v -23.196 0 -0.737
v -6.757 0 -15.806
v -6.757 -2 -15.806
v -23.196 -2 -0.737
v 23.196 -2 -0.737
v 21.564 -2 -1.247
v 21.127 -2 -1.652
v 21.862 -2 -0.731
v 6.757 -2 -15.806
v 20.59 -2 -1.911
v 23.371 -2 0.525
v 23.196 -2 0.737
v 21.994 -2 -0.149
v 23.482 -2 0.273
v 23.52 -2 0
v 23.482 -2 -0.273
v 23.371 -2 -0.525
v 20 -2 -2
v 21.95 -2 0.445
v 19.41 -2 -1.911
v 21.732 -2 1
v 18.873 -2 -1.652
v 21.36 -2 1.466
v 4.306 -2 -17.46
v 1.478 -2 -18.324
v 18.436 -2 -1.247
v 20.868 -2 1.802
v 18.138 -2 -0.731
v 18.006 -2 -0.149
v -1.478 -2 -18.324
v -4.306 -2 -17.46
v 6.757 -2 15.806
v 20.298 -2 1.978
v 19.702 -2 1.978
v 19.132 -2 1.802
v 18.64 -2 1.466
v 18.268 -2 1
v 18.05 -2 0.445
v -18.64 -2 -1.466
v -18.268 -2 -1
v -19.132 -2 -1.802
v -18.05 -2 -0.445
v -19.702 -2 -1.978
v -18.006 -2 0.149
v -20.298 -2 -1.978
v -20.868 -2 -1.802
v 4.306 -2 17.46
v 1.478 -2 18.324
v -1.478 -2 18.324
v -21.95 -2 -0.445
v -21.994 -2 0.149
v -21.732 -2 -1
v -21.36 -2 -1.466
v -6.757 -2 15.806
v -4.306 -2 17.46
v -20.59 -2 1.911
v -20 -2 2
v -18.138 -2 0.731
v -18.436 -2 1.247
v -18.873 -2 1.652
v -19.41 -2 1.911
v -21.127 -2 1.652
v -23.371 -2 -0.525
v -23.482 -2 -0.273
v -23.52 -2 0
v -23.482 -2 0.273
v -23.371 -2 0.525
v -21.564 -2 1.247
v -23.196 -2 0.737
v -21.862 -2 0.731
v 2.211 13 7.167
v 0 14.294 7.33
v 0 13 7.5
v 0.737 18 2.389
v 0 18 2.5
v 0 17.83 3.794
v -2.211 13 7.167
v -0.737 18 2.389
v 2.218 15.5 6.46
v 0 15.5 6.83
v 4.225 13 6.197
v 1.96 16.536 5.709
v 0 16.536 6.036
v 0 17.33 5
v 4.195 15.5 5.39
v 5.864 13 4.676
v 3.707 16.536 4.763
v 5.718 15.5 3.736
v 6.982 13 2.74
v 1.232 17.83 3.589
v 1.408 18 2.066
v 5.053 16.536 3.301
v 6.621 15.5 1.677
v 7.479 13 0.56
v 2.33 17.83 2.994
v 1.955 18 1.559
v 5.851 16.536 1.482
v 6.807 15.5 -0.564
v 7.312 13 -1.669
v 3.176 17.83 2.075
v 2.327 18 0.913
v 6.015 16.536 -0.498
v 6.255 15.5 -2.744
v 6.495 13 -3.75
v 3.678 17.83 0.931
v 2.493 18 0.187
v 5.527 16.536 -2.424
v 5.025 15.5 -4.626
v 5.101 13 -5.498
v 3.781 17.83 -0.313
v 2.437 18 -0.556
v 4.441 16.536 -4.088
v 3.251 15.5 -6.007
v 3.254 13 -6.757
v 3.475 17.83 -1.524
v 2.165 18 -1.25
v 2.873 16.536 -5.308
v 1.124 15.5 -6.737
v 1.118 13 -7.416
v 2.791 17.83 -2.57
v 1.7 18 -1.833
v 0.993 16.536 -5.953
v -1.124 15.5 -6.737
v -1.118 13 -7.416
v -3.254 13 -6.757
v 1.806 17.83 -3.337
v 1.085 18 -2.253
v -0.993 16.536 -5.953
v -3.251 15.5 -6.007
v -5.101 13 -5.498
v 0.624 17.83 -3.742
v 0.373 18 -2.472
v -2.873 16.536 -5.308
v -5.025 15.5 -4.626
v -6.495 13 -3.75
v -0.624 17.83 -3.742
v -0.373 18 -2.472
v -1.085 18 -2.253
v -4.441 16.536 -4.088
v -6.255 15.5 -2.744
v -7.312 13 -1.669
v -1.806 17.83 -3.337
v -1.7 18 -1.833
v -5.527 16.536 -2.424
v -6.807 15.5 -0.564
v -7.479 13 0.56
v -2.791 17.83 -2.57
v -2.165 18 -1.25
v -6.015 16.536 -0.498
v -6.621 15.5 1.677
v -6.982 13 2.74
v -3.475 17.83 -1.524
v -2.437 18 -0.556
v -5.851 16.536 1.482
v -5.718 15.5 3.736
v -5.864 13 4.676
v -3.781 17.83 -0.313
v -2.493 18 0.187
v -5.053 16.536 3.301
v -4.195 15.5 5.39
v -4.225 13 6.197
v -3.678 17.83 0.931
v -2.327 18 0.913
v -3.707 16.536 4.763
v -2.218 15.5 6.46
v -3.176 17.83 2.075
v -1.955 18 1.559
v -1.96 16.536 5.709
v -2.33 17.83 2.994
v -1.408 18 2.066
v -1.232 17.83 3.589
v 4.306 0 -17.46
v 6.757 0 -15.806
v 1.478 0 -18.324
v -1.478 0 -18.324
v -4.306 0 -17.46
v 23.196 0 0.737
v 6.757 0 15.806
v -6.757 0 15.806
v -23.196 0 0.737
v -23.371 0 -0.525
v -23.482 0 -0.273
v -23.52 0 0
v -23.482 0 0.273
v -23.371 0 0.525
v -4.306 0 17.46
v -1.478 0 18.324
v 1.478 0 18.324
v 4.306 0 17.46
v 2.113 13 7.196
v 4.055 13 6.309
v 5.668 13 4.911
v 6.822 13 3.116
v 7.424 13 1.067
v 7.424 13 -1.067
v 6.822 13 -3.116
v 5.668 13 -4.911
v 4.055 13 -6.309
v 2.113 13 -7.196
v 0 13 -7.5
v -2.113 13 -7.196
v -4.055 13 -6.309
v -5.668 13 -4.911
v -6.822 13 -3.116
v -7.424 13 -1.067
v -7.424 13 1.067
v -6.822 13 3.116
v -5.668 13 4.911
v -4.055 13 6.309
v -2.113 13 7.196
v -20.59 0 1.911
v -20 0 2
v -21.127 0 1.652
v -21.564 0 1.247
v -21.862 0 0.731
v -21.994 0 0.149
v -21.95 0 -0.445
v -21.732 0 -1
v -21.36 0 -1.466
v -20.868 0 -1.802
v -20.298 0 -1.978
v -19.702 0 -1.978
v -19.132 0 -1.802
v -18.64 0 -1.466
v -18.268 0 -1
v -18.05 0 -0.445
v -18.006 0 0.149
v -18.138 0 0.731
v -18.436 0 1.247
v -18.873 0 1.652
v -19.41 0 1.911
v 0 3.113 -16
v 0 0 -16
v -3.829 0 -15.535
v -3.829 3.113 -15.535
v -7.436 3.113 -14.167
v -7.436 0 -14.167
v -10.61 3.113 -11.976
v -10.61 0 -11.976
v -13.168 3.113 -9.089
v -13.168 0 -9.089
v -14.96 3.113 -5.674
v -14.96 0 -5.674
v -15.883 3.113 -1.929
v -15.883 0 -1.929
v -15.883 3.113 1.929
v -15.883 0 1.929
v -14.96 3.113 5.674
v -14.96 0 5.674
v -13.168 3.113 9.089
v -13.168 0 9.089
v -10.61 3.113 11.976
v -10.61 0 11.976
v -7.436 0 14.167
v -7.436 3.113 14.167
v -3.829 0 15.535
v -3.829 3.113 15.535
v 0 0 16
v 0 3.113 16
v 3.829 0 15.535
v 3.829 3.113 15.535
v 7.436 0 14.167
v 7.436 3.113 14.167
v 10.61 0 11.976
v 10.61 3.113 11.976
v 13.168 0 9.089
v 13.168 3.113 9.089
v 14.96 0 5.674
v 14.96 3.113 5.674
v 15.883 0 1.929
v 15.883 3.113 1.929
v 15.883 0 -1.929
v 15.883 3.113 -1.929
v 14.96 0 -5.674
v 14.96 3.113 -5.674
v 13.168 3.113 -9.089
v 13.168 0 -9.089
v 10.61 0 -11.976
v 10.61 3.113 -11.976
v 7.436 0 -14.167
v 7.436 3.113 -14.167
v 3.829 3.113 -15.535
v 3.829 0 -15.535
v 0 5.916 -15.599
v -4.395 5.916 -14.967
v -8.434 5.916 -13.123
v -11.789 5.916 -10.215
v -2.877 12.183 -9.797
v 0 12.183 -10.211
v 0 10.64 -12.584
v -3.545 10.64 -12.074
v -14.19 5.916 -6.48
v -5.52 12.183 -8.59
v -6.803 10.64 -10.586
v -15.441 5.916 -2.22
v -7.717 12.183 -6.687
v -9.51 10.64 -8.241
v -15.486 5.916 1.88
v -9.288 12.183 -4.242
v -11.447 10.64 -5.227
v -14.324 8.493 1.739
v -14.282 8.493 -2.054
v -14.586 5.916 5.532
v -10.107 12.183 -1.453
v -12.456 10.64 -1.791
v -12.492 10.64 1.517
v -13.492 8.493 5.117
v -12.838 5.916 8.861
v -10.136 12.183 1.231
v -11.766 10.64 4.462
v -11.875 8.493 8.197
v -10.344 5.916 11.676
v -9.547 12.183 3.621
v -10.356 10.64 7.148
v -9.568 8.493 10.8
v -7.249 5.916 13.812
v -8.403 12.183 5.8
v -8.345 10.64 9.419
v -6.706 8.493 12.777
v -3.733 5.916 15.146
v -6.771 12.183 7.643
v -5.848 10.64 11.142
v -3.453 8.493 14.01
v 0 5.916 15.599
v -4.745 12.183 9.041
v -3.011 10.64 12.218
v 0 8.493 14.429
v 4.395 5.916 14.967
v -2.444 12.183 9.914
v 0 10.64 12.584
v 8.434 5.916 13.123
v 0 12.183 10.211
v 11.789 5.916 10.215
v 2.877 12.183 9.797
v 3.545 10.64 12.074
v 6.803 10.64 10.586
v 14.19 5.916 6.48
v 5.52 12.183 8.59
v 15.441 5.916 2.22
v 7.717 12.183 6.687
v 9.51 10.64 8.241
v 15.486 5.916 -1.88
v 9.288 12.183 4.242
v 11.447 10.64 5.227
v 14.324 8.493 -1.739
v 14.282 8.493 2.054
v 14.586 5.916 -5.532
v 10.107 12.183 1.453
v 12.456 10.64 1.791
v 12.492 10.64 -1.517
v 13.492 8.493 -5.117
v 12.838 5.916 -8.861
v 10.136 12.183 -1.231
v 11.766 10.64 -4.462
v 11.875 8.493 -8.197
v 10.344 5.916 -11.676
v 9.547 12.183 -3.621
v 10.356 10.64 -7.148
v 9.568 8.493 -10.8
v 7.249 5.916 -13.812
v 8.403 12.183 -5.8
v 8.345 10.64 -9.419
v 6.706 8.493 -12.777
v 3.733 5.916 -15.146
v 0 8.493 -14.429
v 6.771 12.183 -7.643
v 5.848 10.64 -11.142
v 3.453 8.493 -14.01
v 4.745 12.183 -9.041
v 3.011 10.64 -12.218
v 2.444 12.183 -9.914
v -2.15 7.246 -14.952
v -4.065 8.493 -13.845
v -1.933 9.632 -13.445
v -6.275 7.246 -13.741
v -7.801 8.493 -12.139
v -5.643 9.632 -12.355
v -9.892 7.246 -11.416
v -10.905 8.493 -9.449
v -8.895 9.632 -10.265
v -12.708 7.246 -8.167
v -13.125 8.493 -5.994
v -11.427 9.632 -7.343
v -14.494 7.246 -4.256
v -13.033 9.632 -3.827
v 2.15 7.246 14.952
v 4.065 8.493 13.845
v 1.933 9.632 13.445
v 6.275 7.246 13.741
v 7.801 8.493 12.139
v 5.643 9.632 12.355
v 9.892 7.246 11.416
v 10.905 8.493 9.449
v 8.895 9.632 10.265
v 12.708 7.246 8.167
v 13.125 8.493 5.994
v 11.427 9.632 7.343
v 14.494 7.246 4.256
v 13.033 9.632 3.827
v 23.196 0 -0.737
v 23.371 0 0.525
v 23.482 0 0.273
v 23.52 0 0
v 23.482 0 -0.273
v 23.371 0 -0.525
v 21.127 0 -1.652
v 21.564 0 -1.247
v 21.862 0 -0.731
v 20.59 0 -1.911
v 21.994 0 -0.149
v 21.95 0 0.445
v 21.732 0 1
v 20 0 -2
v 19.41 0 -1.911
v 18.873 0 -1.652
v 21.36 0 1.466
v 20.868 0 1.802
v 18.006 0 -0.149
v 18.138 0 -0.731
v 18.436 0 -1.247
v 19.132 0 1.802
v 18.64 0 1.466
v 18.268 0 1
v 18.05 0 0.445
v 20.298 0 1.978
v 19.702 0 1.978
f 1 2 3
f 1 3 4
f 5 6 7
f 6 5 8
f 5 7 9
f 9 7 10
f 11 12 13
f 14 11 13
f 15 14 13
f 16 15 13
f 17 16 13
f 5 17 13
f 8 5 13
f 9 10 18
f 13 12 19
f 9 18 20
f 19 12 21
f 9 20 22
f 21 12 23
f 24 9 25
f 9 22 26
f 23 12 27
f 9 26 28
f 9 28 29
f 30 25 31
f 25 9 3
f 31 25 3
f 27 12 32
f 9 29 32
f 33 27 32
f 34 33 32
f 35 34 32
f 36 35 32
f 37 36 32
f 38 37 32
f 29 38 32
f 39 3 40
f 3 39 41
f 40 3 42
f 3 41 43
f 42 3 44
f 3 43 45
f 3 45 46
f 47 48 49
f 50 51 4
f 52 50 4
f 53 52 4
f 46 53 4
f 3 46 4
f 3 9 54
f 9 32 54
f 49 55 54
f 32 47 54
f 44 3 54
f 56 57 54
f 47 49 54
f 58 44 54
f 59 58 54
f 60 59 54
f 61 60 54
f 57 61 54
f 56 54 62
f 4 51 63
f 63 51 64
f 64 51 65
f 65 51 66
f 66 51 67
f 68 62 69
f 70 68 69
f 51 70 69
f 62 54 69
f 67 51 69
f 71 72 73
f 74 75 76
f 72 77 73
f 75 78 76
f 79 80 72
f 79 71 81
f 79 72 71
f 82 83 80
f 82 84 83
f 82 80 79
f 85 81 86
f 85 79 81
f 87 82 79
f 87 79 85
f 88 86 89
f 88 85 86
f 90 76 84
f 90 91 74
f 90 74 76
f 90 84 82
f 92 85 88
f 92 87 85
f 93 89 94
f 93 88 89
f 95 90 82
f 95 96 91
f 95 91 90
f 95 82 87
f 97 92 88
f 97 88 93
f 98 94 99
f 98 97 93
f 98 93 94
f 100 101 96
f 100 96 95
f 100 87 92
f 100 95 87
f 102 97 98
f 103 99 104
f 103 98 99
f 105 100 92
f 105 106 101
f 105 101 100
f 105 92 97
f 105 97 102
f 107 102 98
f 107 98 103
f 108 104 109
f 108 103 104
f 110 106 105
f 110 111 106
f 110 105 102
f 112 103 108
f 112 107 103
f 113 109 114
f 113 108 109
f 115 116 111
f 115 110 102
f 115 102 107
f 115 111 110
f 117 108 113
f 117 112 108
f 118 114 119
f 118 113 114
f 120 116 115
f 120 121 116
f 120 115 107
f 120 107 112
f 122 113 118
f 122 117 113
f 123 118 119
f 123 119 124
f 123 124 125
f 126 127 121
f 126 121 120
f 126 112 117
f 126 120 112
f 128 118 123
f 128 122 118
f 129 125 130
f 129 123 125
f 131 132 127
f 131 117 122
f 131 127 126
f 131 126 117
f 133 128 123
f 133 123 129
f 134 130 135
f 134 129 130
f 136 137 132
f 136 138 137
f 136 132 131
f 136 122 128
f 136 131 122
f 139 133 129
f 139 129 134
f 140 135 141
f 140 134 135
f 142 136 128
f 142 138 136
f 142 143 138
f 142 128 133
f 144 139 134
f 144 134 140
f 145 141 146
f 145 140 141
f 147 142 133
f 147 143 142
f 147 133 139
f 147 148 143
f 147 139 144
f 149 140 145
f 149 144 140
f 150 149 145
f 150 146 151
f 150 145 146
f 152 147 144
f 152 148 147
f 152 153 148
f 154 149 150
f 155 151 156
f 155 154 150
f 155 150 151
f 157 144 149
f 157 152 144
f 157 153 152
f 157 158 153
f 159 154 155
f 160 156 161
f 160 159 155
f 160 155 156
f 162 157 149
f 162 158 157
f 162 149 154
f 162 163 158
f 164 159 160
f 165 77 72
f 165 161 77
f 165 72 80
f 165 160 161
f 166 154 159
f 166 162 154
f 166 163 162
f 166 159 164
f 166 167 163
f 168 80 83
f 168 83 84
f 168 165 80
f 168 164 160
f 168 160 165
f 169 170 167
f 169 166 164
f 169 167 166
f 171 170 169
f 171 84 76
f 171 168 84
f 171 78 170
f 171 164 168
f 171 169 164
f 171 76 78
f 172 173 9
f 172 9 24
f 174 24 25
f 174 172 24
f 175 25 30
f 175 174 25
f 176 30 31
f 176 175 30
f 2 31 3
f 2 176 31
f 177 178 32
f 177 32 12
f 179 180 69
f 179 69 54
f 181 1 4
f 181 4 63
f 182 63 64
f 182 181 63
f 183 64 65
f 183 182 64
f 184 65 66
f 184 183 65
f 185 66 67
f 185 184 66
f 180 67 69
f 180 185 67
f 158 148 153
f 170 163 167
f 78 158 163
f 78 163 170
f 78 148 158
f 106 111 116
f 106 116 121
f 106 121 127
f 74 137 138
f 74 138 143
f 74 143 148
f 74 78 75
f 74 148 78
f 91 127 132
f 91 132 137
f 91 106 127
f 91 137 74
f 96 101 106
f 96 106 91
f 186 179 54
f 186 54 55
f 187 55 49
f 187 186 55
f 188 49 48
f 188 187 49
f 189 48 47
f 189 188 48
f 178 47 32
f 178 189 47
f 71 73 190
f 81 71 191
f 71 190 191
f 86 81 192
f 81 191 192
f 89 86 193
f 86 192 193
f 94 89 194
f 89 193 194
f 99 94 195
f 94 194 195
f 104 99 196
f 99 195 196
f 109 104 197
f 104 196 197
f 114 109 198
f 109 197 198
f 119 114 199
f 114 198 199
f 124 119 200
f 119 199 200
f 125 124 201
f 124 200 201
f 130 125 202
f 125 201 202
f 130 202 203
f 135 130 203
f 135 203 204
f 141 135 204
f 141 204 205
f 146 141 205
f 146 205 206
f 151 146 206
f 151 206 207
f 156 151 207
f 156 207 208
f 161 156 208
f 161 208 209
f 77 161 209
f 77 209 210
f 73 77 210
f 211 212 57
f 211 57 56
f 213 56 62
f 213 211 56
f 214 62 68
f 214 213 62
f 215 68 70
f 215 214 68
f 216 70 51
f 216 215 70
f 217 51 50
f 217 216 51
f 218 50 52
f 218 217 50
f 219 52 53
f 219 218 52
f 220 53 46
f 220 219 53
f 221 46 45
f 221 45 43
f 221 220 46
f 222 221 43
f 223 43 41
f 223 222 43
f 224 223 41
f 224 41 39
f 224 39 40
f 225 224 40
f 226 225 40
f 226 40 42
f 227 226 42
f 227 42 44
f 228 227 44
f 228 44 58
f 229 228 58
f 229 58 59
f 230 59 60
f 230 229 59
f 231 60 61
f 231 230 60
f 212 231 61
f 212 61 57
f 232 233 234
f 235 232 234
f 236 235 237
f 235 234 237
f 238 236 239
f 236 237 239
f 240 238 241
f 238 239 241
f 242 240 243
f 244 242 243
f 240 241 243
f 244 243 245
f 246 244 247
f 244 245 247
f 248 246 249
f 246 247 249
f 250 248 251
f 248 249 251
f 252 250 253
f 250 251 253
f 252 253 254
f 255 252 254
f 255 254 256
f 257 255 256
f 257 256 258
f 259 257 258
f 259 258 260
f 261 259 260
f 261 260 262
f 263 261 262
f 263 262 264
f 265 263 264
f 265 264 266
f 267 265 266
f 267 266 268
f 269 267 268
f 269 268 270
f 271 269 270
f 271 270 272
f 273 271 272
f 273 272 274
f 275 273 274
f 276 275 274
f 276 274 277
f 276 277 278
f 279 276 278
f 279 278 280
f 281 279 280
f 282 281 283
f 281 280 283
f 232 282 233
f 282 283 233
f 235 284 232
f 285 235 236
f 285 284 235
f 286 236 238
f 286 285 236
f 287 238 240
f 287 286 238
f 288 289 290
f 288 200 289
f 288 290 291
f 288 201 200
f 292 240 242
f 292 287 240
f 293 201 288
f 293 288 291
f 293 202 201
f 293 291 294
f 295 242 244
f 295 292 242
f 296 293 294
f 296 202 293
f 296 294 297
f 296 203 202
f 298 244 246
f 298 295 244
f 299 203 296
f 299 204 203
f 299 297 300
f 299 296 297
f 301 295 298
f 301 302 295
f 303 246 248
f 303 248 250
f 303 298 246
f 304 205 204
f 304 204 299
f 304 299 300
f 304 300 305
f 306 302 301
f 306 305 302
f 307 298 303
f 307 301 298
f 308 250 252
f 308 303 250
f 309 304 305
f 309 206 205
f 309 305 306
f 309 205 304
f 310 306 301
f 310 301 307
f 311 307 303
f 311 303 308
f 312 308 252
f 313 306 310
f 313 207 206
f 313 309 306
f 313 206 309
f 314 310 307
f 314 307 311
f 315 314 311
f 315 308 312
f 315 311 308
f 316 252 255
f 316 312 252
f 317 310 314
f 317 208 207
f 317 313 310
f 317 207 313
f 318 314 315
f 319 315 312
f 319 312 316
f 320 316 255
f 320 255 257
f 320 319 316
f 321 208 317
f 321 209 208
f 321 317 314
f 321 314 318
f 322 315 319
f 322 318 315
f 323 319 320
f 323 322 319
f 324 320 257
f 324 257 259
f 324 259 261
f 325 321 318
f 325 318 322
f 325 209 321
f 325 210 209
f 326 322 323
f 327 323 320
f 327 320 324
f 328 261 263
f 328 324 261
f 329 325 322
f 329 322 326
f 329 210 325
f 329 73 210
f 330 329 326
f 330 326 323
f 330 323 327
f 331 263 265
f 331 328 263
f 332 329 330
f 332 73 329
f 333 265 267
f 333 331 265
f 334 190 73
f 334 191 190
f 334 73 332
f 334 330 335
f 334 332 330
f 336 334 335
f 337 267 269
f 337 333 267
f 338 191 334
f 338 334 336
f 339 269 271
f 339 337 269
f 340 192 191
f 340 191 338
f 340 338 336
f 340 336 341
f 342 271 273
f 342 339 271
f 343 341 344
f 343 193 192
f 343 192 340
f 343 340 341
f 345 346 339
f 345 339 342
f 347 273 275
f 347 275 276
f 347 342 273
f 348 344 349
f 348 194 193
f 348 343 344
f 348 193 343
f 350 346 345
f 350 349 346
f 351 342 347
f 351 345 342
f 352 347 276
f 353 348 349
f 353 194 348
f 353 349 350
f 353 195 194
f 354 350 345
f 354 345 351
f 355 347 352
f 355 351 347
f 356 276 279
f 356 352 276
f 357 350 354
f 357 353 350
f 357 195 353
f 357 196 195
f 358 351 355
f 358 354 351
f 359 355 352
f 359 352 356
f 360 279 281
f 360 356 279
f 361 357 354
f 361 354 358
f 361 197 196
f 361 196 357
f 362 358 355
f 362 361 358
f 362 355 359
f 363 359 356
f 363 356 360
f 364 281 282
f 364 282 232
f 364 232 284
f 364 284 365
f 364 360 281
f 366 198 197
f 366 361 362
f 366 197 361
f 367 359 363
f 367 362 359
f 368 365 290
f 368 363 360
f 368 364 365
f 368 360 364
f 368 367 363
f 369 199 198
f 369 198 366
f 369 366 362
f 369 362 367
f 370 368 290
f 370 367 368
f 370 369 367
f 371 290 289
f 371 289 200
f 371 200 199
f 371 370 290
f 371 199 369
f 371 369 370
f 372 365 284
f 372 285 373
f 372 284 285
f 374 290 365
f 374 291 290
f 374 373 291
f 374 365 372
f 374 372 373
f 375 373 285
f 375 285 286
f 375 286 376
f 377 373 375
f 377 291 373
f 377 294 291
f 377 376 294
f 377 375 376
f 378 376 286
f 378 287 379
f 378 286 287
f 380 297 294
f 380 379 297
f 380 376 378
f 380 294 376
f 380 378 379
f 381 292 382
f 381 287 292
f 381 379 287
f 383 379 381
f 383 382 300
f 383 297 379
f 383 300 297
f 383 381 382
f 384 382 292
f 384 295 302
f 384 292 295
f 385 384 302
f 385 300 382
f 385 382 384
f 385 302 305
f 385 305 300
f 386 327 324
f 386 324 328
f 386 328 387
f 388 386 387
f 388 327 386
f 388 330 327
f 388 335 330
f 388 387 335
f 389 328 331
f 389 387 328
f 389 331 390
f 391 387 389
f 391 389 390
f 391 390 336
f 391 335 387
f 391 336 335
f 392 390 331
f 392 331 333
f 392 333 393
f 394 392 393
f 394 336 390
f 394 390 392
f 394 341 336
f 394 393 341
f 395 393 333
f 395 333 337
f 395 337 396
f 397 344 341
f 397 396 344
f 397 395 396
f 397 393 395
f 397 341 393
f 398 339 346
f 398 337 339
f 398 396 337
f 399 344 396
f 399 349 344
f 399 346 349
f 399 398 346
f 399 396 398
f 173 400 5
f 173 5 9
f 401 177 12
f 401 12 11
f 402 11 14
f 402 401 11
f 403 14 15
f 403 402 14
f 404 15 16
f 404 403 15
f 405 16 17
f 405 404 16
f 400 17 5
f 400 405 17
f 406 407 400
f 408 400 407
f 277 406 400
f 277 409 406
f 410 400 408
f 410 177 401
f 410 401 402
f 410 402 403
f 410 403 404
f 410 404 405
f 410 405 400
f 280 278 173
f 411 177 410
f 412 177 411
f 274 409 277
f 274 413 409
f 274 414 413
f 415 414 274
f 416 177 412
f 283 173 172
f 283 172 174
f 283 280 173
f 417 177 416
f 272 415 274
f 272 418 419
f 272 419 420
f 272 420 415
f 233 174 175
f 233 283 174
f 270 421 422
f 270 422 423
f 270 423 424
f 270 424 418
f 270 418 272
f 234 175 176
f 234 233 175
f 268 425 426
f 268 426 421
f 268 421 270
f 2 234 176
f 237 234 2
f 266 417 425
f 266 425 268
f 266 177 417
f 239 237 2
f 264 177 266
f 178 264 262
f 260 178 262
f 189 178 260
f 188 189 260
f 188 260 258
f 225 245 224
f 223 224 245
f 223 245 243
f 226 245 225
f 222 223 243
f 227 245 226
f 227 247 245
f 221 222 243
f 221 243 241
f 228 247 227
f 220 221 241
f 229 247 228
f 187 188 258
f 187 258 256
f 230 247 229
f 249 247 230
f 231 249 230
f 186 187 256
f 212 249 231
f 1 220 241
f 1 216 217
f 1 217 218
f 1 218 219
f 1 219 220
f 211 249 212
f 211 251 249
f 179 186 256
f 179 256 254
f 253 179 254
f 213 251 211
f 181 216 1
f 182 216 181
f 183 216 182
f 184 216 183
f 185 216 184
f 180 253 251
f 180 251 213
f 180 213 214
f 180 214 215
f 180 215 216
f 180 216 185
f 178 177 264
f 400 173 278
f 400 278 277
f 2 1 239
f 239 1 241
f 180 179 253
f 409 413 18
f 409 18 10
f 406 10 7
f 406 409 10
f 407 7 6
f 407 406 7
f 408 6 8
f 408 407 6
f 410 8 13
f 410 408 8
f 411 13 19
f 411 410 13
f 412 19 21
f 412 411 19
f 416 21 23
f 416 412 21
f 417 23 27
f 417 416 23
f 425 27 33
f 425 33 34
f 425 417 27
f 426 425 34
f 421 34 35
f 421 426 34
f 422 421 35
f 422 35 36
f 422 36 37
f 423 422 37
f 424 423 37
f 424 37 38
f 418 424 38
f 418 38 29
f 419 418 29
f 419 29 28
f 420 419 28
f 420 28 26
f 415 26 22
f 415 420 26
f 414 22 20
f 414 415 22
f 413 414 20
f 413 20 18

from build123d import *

# Parameters (mm, degrees)
SKETCH1_R           = 16
BOSS_EXTRUDE1_DEPTH = 13
SKETCH2_R           = 7.5
BOSS_EXTRUDE2_DEPTH = 5
FILLET3_R           = 10
FILLET4_R           = 5
SKETCH3_R           = 2
BOSS_EXTRUDE3_DEPTH = 2


# Some blends are built 0.0001 mm under size
with BuildPart() as part:
    # Sketch1 → Boss-Extrude1 (new body)
    with BuildSketch(Plane(origin=(0, 0, 0), x_dir=(1, 0, 0), z_dir=(0, 1, 0))):
        with Locations(Location((0, 0, 0), (0, 0, 90))):
            Circle(SKETCH1_R)
    extrude(amount=BOSS_EXTRUDE1_DEPTH)

    # Sketch2 → Boss-Extrude2 (add)
    with BuildSketch(Plane(origin=(0, 13, 0), x_dir=(1, 0, 0), z_dir=(0, 1, 0))):
        with Locations(Location((0, 0, 0), (0, 0, 270))):
            Circle(SKETCH2_R)
    extrude(amount=BOSS_EXTRUDE2_DEPTH)

    # Fillet3
    # the kernel refuses this fillet: 10 mm, written as the material it takes off along each edge
    with BuildSketch(Plane(origin=(0, 13, 0), x_dir=(0, 0, -1), z_dir=(1, 0, 0))) as fillet3_piece_1:
        with BuildLine():
            CenterArc((6, -9.886859967), FILLET3_R, 0, 81.373073441)
            Line((7.5, 0), (7.53, 0.197737199))
            ThreePointArc((7.53, 0.197737199), (11.75, 0.2), (16, 0.2))
            Line((16, 0.2), (16.2, 0))
            Line((16.2, 0), (16.2, -9.886859967))
            Line((16.2, -9.886859967), (16, -9.886859967))
        make_face()
    revolve(axis=Axis((0, 13, 0), (0, 1, 0)), mode=Mode.SUBTRACT)

    # Fillet4
    fillet4_edges = [part.edges().sort_by_distance(p)[0] for p in [
        (0, 18, -7.5),
    ]]
    fillet(fillet4_edges, radius=FILLET4_R - 0.0001)  # a hair under: the kernel refuses the full size

    # Sketch3 → Boss-Extrude3 (add)
    with BuildSketch(Plane.XZ):
        with BuildLine():
            Line((6.757246285, 15.805857572), (23.195831847, 0.73715414))
            ThreePointArc((23.195831847, 0.73715414), (23.520107219, 0), (23.195831847, -0.73715414))
            Line((23.195831847, -0.73715414), (6.757246285, -15.805857572))
            ThreePointArc((6.757246285, -15.805857572), (0, -18.43431617), (-6.757246285, -15.805857572))
            Line((-6.757246285, -15.805857572), (-23.195831847, -0.73715414))
            ThreePointArc((-23.195831847, -0.73715414), (-23.520107219, 0), (-23.195831847, 0.73715414))
            Line((-23.195831847, 0.73715414), (-6.757246285, 15.805857572))
            ThreePointArc((-6.757246285, 15.805857572), (0, 18.43431617), (6.757246285, 15.805857572))
        make_face()
        with Locations(Location((20, 0, 0), (0, 0, 270))):
            Circle(SKETCH3_R, mode=Mode.SUBTRACT)
        with Locations(Location((-20, 0, 0), (0, 0, 90))):
            Circle(SKETCH3_R, mode=Mode.SUBTRACT)
    extrude(amount=BOSS_EXTRUDE3_DEPTH)


solid = part.part
